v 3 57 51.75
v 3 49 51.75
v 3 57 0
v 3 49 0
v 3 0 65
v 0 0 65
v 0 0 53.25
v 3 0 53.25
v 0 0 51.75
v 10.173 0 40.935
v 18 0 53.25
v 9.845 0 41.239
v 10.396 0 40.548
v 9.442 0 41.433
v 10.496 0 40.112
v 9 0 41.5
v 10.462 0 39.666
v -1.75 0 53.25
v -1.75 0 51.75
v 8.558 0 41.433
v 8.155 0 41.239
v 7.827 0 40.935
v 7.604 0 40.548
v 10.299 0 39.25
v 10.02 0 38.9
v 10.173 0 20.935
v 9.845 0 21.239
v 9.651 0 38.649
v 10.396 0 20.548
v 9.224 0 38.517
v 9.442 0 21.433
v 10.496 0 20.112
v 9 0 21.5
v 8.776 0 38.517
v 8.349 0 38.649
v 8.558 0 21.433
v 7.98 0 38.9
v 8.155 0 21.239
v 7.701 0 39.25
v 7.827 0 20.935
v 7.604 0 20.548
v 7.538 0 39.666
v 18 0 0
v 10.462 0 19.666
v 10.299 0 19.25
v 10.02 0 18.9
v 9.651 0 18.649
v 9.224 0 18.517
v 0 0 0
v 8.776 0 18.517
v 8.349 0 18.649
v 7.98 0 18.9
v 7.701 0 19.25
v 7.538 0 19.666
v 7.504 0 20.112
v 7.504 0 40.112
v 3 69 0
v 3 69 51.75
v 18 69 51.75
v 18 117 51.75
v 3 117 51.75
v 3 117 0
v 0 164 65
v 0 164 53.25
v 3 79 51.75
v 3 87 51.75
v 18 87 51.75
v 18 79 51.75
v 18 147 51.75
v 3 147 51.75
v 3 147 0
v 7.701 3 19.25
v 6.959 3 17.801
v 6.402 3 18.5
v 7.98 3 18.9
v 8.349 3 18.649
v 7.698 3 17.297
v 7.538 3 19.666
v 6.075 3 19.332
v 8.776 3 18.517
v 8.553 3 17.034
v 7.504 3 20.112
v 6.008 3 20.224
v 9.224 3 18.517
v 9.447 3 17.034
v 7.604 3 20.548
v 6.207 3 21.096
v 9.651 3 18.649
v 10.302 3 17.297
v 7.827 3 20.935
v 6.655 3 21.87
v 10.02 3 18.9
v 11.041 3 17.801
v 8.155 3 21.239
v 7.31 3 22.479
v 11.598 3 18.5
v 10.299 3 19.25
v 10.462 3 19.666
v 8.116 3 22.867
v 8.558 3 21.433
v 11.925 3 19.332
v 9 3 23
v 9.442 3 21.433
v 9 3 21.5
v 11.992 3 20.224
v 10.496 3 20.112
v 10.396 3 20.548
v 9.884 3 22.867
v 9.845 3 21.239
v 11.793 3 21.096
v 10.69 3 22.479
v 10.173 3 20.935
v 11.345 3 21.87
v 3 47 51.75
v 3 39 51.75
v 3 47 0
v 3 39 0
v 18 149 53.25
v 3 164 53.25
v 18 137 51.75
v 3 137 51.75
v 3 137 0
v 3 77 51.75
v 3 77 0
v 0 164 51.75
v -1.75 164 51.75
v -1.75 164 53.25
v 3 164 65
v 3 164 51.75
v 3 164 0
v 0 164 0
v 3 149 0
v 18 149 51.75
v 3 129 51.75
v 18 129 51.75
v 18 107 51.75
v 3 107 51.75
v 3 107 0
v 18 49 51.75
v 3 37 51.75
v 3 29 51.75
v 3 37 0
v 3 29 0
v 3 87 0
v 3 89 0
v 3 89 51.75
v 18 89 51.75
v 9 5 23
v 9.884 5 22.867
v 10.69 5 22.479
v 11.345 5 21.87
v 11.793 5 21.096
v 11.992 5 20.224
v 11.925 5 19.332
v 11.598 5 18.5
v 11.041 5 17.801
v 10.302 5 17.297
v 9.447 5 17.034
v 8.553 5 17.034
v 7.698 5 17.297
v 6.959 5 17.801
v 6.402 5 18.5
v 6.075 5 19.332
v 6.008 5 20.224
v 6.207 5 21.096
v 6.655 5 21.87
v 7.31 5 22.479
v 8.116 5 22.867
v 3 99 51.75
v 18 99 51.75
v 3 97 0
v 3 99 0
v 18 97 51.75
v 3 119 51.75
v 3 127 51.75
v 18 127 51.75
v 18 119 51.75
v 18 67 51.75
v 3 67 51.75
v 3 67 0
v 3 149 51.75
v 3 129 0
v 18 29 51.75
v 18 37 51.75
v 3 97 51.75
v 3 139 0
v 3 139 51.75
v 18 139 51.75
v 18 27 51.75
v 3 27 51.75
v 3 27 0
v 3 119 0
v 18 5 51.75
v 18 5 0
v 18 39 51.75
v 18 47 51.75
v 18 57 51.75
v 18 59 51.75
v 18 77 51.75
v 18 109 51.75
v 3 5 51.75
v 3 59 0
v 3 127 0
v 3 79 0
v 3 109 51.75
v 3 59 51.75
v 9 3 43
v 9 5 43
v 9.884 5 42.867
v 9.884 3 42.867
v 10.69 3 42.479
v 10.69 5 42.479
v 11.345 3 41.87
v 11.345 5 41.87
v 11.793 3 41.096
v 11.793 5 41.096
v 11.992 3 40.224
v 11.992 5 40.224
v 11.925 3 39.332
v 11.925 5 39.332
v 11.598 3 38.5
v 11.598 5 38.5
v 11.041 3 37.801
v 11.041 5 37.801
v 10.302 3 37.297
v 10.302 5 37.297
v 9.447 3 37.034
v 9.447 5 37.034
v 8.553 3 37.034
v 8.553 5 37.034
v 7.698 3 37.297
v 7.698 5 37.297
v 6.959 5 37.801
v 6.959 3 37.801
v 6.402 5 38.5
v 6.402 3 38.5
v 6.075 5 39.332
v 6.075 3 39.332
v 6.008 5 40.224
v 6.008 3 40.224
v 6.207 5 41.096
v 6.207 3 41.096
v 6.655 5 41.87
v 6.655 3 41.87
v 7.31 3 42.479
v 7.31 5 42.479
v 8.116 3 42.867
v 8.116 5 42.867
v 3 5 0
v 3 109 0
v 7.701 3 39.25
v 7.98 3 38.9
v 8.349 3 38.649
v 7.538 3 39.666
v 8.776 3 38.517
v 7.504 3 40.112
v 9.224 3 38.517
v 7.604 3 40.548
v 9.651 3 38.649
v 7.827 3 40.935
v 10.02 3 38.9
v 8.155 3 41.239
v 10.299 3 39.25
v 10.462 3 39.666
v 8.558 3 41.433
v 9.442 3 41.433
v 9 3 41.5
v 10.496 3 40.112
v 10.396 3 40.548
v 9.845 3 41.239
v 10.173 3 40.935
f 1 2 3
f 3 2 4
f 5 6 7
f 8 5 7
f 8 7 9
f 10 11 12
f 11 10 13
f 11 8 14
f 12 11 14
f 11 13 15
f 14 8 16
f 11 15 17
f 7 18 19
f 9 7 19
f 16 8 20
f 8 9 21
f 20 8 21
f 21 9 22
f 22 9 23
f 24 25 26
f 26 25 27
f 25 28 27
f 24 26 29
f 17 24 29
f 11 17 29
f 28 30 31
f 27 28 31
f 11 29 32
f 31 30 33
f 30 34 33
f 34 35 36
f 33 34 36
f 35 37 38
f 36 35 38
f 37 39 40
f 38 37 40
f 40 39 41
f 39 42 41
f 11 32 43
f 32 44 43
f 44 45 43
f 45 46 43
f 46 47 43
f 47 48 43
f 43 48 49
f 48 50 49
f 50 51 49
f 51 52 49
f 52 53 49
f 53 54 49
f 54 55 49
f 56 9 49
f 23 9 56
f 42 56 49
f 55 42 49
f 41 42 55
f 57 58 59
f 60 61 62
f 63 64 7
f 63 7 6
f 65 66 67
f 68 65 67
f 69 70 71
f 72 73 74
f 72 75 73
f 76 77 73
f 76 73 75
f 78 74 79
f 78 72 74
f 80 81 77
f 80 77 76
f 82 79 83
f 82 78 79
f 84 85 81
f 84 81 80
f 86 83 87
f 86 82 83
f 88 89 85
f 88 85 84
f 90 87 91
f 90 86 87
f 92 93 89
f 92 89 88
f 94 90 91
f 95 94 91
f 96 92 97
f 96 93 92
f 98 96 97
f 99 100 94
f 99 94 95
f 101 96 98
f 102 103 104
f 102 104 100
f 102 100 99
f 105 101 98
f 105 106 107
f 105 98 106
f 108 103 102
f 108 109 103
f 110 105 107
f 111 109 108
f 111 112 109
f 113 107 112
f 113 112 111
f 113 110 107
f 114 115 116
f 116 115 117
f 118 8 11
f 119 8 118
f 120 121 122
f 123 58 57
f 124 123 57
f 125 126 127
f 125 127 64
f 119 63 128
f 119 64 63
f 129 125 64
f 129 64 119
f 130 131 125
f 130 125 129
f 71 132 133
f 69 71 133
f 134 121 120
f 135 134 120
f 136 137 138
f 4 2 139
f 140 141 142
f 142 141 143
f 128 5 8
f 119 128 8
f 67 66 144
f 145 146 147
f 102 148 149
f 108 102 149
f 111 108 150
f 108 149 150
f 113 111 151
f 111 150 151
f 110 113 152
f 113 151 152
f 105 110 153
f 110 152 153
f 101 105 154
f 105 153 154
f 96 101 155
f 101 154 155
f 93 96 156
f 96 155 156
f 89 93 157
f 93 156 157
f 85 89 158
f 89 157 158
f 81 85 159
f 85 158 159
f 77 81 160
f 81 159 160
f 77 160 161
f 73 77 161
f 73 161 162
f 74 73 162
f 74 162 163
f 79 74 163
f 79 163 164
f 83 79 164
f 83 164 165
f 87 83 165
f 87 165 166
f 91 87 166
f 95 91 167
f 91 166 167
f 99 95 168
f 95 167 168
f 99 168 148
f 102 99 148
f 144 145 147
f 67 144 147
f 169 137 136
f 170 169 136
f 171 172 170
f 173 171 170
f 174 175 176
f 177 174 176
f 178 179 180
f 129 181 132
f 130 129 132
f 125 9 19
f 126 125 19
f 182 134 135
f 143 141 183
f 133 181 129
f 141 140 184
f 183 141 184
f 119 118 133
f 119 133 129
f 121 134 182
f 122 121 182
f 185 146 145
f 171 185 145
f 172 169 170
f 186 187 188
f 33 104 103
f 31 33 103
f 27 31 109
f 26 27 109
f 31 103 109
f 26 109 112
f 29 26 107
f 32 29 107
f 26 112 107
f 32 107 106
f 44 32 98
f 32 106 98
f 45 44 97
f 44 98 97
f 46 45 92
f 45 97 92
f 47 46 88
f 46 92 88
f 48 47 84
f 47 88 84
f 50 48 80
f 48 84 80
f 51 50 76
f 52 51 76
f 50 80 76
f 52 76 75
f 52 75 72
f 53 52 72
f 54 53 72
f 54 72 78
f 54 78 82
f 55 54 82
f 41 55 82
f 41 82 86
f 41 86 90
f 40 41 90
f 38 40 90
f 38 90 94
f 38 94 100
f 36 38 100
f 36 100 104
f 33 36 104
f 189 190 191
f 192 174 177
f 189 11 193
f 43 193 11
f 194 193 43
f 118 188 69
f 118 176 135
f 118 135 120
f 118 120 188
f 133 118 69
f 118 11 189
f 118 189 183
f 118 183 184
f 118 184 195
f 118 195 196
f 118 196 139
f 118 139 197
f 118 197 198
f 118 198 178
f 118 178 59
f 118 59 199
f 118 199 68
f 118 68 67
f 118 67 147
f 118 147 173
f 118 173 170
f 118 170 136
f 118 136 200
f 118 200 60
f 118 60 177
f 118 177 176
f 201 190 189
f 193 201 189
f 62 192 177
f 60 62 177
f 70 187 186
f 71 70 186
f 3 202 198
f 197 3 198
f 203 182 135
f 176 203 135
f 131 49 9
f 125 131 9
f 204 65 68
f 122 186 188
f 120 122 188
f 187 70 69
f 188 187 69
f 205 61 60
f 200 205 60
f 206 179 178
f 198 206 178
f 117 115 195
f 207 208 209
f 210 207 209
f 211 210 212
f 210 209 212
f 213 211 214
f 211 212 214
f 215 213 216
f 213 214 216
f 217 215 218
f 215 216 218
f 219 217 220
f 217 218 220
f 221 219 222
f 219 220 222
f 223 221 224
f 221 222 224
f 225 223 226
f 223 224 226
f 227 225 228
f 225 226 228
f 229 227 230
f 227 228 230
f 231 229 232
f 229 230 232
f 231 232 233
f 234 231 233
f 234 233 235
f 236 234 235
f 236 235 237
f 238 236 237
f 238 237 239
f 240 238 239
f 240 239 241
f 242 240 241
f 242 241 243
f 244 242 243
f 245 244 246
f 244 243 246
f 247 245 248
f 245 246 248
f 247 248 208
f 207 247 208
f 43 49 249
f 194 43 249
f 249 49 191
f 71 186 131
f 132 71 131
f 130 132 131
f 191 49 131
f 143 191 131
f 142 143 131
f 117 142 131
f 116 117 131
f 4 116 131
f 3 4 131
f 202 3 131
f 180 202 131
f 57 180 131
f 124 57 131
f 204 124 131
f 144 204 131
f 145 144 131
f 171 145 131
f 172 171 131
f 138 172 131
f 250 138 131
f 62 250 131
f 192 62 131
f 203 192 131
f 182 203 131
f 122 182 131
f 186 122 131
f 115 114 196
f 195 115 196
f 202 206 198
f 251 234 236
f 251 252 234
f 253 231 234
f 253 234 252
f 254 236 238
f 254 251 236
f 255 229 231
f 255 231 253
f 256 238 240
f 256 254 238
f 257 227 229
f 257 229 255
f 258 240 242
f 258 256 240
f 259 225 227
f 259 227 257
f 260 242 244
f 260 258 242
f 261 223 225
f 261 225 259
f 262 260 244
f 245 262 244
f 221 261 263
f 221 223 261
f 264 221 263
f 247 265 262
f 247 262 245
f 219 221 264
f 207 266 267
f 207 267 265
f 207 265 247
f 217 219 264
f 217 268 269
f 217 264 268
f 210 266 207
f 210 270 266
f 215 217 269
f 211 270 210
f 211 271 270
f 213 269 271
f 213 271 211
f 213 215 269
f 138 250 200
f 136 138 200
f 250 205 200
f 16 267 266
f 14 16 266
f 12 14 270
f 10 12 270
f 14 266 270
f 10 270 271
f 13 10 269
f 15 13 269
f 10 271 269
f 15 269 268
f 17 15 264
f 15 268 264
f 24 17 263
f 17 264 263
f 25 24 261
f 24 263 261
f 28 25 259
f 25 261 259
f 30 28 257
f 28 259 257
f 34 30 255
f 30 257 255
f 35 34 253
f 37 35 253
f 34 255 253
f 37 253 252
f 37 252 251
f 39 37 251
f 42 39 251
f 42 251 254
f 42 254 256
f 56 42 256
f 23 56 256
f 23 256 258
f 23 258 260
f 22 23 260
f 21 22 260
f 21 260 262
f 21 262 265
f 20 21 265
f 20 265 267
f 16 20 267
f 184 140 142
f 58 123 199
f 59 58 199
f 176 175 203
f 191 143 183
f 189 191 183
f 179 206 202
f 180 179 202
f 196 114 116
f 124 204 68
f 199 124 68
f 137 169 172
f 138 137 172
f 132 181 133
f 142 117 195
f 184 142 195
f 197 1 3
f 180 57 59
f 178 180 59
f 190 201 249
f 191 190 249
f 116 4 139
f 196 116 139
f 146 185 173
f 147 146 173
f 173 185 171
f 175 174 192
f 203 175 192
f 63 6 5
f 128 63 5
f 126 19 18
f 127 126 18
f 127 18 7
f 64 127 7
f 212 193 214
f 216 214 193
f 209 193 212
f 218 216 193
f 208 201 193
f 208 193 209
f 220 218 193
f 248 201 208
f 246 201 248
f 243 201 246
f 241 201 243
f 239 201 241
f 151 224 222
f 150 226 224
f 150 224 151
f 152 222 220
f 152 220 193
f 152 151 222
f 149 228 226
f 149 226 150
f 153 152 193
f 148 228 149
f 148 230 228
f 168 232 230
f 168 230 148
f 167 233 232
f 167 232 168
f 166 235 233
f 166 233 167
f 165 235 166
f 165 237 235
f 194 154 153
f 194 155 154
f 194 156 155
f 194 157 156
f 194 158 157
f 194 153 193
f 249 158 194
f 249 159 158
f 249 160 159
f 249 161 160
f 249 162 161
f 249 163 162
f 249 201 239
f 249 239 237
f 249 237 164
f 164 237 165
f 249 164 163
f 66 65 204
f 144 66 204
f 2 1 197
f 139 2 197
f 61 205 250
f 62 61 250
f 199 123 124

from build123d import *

# Parameters (mm, degrees)
EXTRUDE_1_DEPTH     = 164
SKETCH_3_R          = 1.5
CUT_EXTRUDE_1_DEPTH = 164
SKETCH_4_W          = 2
SKETCH_4_H          = 2
EXTRUDE_2_DEPTH     = 164
SKETCH_5_W          = 0.25
SKETCH_5_H          = 1.5
CUT_EXTRUDE_2_DEPTH = 164
SKETCH_6_W          = 15
SKETCH_6_H          = 50
CUT_EXTRUDE_3_DEPTH = 159
SKETCH_7_W          = 15
SKETCH_7_H          = 1.5
EXTRUDE_3_DEPTH     = 159
SKETCH_8_W          = 3.25
SKETCH_8_H          = 5
EXTRUDE_4_DEPTH     = 15
CUT_EXTRUDE_4_DEPTH = 15
SKETCH_10_R         = 3
CUT_EXTRUDE_5_DEPTH = 2
SKETCH_11_W         = 51.75
SKETCH_11_H         = 2
EXTRUDE_5_DEPTH     = 15
CUT_EXTRUDE_6_DEPTH = 130


with BuildPart() as part:
    # 草图1 → 凸台-拉伸1 (new body)
    with BuildSketch(Plane(origin=(0, 0, 0), x_dir=(1, 0, 0), z_dir=(0, 1, 0))):
        Polygon((0, 0), (0, -65), (3, -65), (3, -50), (18, -50), (18, 0), align=None)
    extrude(amount=EXTRUDE_1_DEPTH)

    # 草图3 → 切除-拉伸1 (cut)
    with BuildSketch(Plane(origin=(0, 164, 0), x_dir=(1, 0, 0), z_dir=(0, 1, 0))):
        with Locations(Location((9, -20, 0), (0, 0, 270))):
            Circle(SKETCH_3_R)
        with Locations(Location((9, -40, 0), (0, 0, 270))):
            Circle(SKETCH_3_R)
    extrude(amount=-CUT_EXTRUDE_1_DEPTH, mode=Mode.SUBTRACT)

    # 草图4 → 凸台-拉伸2 (add)
    with BuildSketch(Plane(origin=(0, 164, 0), x_dir=(1, 0, 0), z_dir=(0, 1, 0))):
        with Locations((-1, -52.5)):
            Rectangle(SKETCH_4_W, SKETCH_4_H)
    extrude(amount=-EXTRUDE_2_DEPTH)

    # 草图5 → 切除-拉伸2 (cut)
    with BuildSketch(Plane.XZ):
        Polygon((-1.75, 51.75), (-2, 51.75), (-2, 51.5), (0, 51.5), (0, 51.75), align=None)
        with Locations((-1.875, 52.5)):
            Rectangle(SKETCH_5_W, SKETCH_5_H)
        Polygon((-2, 53.5), (-2, 53.25), (-1.75, 53.25), (0, 53.25), (0, 53.5), align=None)
    extrude(amount=-CUT_EXTRUDE_2_DEPTH, mode=Mode.SUBTRACT)

    # 草图6 → 切除-拉伸3 (cut)
    with BuildSketch(Plane(origin=(0, 164, 0), x_dir=(1, 0, 0), z_dir=(0, 1, 0))):
        with Locations((10.5, -25)):
            Rectangle(SKETCH_6_W, SKETCH_6_H)
    extrude(amount=-CUT_EXTRUDE_3_DEPTH, mode=Mode.SUBTRACT)

    # 草图7 → 凸台-拉伸3 (add)
    with BuildSketch(Plane(origin=(0, 164, 0), x_dir=(1, 0, 0), z_dir=(0, 1, 0))):
        with Locations((10.5, -52.5)):
            Rectangle(SKETCH_7_W, SKETCH_7_H)
    extrude(amount=-EXTRUDE_3_DEPTH)

    # 草图8 → 凸台-拉伸4 (add)
    with BuildSketch(Plane(origin=(3, 0, 0), x_dir=(0, 0, -1), z_dir=(1, 0, 0))):
        with Locations((-51.625, 2.5)):
            Rectangle(SKETCH_8_W, SKETCH_8_H)
    extrude(amount=EXTRUDE_4_DEPTH)

    # 草图9 → 切除-拉伸4 (cut)
    with BuildSketch(Plane.XY.offset(53.25)):
        Polygon((3, 164), (18, 164), (18, 149), align=None)
    extrude(amount=-CUT_EXTRUDE_4_DEPTH, mode=Mode.SUBTRACT)

    # 草图10 → 切除-拉伸5 (cut)
    with BuildSketch(Plane(origin=(0, 5, 0), x_dir=(1, 0, 0), z_dir=(0, 1, 0))):
        with Locations(Location((9, -20, 0), (0, 0, 270))):
            Circle(SKETCH_10_R)
        with Locations(Location((9, -40, 0), (0, 0, 270))):
            Circle(SKETCH_10_R)
    extrude(amount=-CUT_EXTRUDE_5_DEPTH, mode=Mode.SUBTRACT)

    # 草图11 → 凸台-拉伸5 (add)
    with BuildSketch(Plane(origin=(3, 0, 0), x_dir=(0, 0, -1), z_dir=(1, 0, 0))):
        with Locations((-25.875, 148)):
            Rectangle(SKETCH_11_W, SKETCH_11_H)
        with Locations((-25.875, 138)):
            Rectangle(SKETCH_11_W, SKETCH_11_H)
        with Locations((-25.875, 128)):
            Rectangle(SKETCH_11_W, SKETCH_11_H)
        with Locations((-25.875, 118)):
            Rectangle(SKETCH_11_W, SKETCH_11_H)
        with Locations((-25.875, 108)):
            Rectangle(SKETCH_11_W, SKETCH_11_H)
        with Locations((-25.875, 98)):
            Rectangle(SKETCH_11_W, SKETCH_11_H)
        with Locations((-25.875, 88)):
            Rectangle(SKETCH_11_W, SKETCH_11_H)
        with Locations((-25.875, 78)):
            Rectangle(SKETCH_11_W, SKETCH_11_H)
        with Locations((-25.875, 68)):
            Rectangle(SKETCH_11_W, SKETCH_11_H)
        with Locations((-25.875, 58)):
            Rectangle(SKETCH_11_W, SKETCH_11_H)
        with Locations((-25.875, 48)):
            Rectangle(SKETCH_11_W, SKETCH_11_H)
        with Locations((-25.875, 38)):
            Rectangle(SKETCH_11_W, SKETCH_11_H)
        with Locations((-25.875, 28)):
            Rectangle(SKETCH_11_W, SKETCH_11_H)
    extrude(amount=EXTRUDE_5_DEPTH)

    # 草图12 → 切除-拉伸6 (cut)
    with BuildSketch(Plane(origin=(0, 149, 0), x_dir=(1, 0, 0), z_dir=(0, 1, 0))):
        Polygon((3, 0), (18, -51.75), (18, 0), align=None)
    extrude(amount=-CUT_EXTRUDE_6_DEPTH, mode=Mode.SUBTRACT)


solid = part.part
